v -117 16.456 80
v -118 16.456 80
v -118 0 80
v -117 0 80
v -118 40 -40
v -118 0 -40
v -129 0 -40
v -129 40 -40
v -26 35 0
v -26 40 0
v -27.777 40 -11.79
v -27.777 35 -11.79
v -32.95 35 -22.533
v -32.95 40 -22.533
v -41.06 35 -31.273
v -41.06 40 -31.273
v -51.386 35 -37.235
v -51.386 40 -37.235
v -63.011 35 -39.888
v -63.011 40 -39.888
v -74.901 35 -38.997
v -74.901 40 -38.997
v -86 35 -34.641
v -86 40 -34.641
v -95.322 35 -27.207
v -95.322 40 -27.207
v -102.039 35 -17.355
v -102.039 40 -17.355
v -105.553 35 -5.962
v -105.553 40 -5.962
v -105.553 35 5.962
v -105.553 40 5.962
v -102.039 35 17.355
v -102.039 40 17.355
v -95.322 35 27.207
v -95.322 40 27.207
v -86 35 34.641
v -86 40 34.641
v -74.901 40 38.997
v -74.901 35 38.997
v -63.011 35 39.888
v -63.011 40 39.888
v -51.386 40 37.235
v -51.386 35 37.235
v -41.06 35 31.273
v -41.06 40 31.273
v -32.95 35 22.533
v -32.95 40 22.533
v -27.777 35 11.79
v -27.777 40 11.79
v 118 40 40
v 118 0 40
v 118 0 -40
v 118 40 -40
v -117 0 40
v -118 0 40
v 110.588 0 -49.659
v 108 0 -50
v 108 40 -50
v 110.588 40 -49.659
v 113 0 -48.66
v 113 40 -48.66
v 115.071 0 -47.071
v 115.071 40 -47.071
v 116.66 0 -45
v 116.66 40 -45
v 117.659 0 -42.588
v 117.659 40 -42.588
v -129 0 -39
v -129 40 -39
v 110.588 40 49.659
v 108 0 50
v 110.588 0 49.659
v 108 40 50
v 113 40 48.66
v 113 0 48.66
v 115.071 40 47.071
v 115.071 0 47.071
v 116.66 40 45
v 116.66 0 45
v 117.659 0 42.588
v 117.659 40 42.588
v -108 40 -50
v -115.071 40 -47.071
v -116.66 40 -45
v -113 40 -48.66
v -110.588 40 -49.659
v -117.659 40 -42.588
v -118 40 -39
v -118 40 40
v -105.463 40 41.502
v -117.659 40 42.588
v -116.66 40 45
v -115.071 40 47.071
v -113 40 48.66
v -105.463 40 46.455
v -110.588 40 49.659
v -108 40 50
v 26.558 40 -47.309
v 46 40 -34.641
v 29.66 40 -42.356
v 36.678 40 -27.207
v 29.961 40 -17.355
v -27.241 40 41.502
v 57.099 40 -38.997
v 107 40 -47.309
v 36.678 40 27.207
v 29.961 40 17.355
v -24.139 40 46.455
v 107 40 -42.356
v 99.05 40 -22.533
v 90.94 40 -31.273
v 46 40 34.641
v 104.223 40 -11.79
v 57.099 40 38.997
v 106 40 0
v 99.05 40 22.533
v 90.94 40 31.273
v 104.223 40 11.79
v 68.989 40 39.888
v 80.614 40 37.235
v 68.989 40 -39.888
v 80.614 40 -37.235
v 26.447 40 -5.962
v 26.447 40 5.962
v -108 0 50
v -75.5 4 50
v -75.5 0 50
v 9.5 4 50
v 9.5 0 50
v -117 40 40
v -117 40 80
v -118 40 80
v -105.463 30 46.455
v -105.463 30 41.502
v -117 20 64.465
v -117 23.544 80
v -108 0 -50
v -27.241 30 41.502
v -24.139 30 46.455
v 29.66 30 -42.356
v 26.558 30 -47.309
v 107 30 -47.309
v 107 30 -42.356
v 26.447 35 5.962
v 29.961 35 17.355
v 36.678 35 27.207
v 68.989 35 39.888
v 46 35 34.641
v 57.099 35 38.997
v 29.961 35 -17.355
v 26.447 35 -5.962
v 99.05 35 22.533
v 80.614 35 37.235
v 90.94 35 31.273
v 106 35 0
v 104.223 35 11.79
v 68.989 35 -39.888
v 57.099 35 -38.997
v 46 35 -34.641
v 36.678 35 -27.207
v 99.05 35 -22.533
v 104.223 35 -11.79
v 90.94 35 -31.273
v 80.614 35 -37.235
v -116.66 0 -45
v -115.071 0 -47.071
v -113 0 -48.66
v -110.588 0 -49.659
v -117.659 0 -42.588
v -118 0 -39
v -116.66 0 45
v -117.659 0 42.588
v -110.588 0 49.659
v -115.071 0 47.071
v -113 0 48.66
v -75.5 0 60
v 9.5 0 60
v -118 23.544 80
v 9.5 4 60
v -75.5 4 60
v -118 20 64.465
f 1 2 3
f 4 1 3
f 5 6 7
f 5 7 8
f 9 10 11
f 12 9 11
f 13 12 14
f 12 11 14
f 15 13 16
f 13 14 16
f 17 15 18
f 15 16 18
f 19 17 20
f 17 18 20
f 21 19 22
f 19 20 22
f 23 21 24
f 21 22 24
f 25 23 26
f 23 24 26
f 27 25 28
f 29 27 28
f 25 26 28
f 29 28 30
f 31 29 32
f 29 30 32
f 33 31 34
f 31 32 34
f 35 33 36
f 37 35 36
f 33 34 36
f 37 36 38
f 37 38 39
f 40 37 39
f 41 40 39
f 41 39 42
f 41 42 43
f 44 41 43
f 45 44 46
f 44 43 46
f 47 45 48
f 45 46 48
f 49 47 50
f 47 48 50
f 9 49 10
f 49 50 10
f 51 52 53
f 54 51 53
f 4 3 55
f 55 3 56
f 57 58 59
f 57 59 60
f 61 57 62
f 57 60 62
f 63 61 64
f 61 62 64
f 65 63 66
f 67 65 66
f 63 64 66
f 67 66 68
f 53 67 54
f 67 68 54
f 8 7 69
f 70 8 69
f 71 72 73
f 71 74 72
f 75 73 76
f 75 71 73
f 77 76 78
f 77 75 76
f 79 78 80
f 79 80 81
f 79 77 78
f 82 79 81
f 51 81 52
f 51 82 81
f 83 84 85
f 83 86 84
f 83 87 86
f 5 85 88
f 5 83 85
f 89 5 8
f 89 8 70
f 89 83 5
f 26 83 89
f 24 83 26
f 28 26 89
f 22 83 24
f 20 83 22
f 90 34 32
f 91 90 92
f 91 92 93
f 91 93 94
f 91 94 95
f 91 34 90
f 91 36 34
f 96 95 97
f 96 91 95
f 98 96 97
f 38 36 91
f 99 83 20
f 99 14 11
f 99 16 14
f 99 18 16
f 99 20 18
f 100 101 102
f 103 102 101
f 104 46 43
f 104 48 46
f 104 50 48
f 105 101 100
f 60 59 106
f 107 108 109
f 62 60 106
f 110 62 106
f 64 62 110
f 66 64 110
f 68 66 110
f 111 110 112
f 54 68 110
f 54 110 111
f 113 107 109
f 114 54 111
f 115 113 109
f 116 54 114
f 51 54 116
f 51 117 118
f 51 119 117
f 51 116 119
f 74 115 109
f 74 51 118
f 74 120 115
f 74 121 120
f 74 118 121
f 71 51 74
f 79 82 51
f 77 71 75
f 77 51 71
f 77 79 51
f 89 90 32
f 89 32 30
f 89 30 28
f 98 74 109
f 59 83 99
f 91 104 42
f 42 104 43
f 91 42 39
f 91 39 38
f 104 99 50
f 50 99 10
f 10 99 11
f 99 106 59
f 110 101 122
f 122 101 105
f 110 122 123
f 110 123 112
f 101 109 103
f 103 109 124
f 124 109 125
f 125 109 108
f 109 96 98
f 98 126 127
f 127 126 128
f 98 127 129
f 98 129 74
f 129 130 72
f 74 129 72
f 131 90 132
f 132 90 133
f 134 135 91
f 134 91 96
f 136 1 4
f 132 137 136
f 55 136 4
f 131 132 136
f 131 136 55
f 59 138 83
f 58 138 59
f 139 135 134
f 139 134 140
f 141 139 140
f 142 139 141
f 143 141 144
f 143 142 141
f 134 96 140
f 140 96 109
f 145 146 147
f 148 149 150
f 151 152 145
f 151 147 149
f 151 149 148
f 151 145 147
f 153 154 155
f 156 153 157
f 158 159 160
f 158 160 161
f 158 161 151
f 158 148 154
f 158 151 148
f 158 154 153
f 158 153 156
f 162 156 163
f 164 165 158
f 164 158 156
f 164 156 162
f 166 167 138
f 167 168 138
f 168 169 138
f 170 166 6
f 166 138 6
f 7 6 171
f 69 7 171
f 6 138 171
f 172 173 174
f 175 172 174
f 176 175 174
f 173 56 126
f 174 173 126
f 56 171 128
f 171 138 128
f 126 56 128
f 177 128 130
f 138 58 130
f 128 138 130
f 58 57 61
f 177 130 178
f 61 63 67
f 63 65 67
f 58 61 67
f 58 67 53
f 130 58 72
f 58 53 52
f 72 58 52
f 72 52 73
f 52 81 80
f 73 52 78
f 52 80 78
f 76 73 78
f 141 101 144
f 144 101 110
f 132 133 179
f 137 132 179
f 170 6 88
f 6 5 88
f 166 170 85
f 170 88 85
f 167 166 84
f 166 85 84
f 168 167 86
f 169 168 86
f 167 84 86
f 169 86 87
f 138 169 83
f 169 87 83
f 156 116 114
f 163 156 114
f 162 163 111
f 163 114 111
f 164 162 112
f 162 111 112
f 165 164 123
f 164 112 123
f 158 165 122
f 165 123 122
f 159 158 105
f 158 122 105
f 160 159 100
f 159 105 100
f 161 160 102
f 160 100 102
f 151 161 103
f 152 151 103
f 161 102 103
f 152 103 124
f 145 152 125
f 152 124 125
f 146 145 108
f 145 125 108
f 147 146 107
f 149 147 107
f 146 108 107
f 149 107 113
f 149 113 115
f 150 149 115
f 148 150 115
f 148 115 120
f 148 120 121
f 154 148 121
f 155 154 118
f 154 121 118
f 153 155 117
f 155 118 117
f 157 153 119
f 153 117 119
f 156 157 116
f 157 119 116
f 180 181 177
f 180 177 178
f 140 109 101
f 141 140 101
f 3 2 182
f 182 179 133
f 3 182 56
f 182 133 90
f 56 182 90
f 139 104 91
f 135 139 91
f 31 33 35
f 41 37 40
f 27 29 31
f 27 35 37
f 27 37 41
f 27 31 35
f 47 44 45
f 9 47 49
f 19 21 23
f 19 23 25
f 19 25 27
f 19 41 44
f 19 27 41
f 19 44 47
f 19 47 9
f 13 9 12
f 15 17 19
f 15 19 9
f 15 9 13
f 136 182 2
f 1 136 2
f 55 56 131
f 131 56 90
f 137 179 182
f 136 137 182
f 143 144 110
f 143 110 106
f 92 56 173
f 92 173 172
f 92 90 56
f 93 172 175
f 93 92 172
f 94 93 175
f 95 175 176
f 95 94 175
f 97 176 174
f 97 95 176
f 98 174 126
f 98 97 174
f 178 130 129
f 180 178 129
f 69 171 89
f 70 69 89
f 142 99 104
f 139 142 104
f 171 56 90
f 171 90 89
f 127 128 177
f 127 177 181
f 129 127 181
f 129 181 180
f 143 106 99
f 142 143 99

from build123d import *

# Parameters (mm, degrees)
SKETCH1_W           = 236
SKETCH1_H           = 100
BOSS_EXTRUDE1_DEPTH = 40
SKETCH2_R           = 40
CUT_EXTRUDE1_DEPTH  = 5
FILLET1_R           = 10
CUT_EXTRUDE2_DEPTH  = 10
SKETCH4_W           = 85
SKETCH4_H           = 4
BOSS_EXTRUDE2_DEPTH = 10
BOSS_EXTRUDE3_DEPTH = 1
SKETCH6_W           = 1
SKETCH6_H           = 40
BOSS_EXTRUDE4_DEPTH = 11


with BuildPart() as part:
    # Sketch1 → Boss-Extrude1 (new body)
    with BuildSketch(Plane(origin=(0, 0, 0), x_dir=(1, 0, 0), z_dir=(0, 1, 0))):
        Rectangle(SKETCH1_W, SKETCH1_H)
    extrude(amount=BOSS_EXTRUDE1_DEPTH)

    # Sketch2 → Cut-Extrude1 (cut)
    with BuildSketch(Plane(origin=(0, 40, 0), x_dir=(1, 0, 0), z_dir=(0, 1, 0))):
        with Locations((-66, 0)):
            Circle(SKETCH2_R)
        with Locations((66, 0)):
            Circle(SKETCH2_R)
    extrude(amount=-CUT_EXTRUDE1_DEPTH, mode=Mode.SUBTRACT)

    # Fillet1
    fillet1_edges = [part.edges().sort_by_distance(p)[0] for p in [
        (118, 20, 50),
        (-118, 20, 50),
        (-118, 20, -50),
        (118, 20, -50),
    ]]
    fillet(fillet1_edges, radius=FILLET1_R)

    # Sketch3 → Cut-Extrude2 (cut)
    with BuildSketch(Plane(origin=(0, 40, 0), x_dir=(1, 0, 0), z_dir=(0, 1, 0))):
        Polygon((-105.463124796, -41.502087977), (-105.463124796, -46.455012056), (-24.138936023, -46.455012056), (29.66006691, 42.356040404), (107.000239166, 42.356040404), (107.000239166, 47.308964484), (26.557920495, 47.308964484), (-27.241082437, -41.502087977), align=None)
    extrude(amount=-CUT_EXTRUDE2_DEPTH, mode=Mode.SUBTRACT)

    # Sketch4 → Boss-Extrude2 (add)
    with BuildSketch(Plane.XY.offset(50)):
        with Locations((-33, 2)):
            Rectangle(SKETCH4_W, SKETCH4_H)
    extrude(amount=BOSS_EXTRUDE2_DEPTH)

    # Sketch6 → Boss-Extrude4 (add)
    with BuildSketch(Plane.ZY.offset(118)):
        with Locations((-39.5, 20)):
            Rectangle(SKETCH6_W, SKETCH6_H)
    extrude(amount=BOSS_EXTRUDE4_DEPTH)


with BuildPart() as body_2:
    # Sketch5 → Boss-Extrude3 (new body)
    with BuildSketch(Plane.ZY.offset(118)):
        Polygon((40, 40), (80, 40), (80, 23.543767562), (64.464749099, 20), (80, 16.456232438), (80, 0), (40, 0), align=None)
    extrude(amount=-BOSS_EXTRUDE3_DEPTH)


solid = Compound([part.part, body_2.part])
